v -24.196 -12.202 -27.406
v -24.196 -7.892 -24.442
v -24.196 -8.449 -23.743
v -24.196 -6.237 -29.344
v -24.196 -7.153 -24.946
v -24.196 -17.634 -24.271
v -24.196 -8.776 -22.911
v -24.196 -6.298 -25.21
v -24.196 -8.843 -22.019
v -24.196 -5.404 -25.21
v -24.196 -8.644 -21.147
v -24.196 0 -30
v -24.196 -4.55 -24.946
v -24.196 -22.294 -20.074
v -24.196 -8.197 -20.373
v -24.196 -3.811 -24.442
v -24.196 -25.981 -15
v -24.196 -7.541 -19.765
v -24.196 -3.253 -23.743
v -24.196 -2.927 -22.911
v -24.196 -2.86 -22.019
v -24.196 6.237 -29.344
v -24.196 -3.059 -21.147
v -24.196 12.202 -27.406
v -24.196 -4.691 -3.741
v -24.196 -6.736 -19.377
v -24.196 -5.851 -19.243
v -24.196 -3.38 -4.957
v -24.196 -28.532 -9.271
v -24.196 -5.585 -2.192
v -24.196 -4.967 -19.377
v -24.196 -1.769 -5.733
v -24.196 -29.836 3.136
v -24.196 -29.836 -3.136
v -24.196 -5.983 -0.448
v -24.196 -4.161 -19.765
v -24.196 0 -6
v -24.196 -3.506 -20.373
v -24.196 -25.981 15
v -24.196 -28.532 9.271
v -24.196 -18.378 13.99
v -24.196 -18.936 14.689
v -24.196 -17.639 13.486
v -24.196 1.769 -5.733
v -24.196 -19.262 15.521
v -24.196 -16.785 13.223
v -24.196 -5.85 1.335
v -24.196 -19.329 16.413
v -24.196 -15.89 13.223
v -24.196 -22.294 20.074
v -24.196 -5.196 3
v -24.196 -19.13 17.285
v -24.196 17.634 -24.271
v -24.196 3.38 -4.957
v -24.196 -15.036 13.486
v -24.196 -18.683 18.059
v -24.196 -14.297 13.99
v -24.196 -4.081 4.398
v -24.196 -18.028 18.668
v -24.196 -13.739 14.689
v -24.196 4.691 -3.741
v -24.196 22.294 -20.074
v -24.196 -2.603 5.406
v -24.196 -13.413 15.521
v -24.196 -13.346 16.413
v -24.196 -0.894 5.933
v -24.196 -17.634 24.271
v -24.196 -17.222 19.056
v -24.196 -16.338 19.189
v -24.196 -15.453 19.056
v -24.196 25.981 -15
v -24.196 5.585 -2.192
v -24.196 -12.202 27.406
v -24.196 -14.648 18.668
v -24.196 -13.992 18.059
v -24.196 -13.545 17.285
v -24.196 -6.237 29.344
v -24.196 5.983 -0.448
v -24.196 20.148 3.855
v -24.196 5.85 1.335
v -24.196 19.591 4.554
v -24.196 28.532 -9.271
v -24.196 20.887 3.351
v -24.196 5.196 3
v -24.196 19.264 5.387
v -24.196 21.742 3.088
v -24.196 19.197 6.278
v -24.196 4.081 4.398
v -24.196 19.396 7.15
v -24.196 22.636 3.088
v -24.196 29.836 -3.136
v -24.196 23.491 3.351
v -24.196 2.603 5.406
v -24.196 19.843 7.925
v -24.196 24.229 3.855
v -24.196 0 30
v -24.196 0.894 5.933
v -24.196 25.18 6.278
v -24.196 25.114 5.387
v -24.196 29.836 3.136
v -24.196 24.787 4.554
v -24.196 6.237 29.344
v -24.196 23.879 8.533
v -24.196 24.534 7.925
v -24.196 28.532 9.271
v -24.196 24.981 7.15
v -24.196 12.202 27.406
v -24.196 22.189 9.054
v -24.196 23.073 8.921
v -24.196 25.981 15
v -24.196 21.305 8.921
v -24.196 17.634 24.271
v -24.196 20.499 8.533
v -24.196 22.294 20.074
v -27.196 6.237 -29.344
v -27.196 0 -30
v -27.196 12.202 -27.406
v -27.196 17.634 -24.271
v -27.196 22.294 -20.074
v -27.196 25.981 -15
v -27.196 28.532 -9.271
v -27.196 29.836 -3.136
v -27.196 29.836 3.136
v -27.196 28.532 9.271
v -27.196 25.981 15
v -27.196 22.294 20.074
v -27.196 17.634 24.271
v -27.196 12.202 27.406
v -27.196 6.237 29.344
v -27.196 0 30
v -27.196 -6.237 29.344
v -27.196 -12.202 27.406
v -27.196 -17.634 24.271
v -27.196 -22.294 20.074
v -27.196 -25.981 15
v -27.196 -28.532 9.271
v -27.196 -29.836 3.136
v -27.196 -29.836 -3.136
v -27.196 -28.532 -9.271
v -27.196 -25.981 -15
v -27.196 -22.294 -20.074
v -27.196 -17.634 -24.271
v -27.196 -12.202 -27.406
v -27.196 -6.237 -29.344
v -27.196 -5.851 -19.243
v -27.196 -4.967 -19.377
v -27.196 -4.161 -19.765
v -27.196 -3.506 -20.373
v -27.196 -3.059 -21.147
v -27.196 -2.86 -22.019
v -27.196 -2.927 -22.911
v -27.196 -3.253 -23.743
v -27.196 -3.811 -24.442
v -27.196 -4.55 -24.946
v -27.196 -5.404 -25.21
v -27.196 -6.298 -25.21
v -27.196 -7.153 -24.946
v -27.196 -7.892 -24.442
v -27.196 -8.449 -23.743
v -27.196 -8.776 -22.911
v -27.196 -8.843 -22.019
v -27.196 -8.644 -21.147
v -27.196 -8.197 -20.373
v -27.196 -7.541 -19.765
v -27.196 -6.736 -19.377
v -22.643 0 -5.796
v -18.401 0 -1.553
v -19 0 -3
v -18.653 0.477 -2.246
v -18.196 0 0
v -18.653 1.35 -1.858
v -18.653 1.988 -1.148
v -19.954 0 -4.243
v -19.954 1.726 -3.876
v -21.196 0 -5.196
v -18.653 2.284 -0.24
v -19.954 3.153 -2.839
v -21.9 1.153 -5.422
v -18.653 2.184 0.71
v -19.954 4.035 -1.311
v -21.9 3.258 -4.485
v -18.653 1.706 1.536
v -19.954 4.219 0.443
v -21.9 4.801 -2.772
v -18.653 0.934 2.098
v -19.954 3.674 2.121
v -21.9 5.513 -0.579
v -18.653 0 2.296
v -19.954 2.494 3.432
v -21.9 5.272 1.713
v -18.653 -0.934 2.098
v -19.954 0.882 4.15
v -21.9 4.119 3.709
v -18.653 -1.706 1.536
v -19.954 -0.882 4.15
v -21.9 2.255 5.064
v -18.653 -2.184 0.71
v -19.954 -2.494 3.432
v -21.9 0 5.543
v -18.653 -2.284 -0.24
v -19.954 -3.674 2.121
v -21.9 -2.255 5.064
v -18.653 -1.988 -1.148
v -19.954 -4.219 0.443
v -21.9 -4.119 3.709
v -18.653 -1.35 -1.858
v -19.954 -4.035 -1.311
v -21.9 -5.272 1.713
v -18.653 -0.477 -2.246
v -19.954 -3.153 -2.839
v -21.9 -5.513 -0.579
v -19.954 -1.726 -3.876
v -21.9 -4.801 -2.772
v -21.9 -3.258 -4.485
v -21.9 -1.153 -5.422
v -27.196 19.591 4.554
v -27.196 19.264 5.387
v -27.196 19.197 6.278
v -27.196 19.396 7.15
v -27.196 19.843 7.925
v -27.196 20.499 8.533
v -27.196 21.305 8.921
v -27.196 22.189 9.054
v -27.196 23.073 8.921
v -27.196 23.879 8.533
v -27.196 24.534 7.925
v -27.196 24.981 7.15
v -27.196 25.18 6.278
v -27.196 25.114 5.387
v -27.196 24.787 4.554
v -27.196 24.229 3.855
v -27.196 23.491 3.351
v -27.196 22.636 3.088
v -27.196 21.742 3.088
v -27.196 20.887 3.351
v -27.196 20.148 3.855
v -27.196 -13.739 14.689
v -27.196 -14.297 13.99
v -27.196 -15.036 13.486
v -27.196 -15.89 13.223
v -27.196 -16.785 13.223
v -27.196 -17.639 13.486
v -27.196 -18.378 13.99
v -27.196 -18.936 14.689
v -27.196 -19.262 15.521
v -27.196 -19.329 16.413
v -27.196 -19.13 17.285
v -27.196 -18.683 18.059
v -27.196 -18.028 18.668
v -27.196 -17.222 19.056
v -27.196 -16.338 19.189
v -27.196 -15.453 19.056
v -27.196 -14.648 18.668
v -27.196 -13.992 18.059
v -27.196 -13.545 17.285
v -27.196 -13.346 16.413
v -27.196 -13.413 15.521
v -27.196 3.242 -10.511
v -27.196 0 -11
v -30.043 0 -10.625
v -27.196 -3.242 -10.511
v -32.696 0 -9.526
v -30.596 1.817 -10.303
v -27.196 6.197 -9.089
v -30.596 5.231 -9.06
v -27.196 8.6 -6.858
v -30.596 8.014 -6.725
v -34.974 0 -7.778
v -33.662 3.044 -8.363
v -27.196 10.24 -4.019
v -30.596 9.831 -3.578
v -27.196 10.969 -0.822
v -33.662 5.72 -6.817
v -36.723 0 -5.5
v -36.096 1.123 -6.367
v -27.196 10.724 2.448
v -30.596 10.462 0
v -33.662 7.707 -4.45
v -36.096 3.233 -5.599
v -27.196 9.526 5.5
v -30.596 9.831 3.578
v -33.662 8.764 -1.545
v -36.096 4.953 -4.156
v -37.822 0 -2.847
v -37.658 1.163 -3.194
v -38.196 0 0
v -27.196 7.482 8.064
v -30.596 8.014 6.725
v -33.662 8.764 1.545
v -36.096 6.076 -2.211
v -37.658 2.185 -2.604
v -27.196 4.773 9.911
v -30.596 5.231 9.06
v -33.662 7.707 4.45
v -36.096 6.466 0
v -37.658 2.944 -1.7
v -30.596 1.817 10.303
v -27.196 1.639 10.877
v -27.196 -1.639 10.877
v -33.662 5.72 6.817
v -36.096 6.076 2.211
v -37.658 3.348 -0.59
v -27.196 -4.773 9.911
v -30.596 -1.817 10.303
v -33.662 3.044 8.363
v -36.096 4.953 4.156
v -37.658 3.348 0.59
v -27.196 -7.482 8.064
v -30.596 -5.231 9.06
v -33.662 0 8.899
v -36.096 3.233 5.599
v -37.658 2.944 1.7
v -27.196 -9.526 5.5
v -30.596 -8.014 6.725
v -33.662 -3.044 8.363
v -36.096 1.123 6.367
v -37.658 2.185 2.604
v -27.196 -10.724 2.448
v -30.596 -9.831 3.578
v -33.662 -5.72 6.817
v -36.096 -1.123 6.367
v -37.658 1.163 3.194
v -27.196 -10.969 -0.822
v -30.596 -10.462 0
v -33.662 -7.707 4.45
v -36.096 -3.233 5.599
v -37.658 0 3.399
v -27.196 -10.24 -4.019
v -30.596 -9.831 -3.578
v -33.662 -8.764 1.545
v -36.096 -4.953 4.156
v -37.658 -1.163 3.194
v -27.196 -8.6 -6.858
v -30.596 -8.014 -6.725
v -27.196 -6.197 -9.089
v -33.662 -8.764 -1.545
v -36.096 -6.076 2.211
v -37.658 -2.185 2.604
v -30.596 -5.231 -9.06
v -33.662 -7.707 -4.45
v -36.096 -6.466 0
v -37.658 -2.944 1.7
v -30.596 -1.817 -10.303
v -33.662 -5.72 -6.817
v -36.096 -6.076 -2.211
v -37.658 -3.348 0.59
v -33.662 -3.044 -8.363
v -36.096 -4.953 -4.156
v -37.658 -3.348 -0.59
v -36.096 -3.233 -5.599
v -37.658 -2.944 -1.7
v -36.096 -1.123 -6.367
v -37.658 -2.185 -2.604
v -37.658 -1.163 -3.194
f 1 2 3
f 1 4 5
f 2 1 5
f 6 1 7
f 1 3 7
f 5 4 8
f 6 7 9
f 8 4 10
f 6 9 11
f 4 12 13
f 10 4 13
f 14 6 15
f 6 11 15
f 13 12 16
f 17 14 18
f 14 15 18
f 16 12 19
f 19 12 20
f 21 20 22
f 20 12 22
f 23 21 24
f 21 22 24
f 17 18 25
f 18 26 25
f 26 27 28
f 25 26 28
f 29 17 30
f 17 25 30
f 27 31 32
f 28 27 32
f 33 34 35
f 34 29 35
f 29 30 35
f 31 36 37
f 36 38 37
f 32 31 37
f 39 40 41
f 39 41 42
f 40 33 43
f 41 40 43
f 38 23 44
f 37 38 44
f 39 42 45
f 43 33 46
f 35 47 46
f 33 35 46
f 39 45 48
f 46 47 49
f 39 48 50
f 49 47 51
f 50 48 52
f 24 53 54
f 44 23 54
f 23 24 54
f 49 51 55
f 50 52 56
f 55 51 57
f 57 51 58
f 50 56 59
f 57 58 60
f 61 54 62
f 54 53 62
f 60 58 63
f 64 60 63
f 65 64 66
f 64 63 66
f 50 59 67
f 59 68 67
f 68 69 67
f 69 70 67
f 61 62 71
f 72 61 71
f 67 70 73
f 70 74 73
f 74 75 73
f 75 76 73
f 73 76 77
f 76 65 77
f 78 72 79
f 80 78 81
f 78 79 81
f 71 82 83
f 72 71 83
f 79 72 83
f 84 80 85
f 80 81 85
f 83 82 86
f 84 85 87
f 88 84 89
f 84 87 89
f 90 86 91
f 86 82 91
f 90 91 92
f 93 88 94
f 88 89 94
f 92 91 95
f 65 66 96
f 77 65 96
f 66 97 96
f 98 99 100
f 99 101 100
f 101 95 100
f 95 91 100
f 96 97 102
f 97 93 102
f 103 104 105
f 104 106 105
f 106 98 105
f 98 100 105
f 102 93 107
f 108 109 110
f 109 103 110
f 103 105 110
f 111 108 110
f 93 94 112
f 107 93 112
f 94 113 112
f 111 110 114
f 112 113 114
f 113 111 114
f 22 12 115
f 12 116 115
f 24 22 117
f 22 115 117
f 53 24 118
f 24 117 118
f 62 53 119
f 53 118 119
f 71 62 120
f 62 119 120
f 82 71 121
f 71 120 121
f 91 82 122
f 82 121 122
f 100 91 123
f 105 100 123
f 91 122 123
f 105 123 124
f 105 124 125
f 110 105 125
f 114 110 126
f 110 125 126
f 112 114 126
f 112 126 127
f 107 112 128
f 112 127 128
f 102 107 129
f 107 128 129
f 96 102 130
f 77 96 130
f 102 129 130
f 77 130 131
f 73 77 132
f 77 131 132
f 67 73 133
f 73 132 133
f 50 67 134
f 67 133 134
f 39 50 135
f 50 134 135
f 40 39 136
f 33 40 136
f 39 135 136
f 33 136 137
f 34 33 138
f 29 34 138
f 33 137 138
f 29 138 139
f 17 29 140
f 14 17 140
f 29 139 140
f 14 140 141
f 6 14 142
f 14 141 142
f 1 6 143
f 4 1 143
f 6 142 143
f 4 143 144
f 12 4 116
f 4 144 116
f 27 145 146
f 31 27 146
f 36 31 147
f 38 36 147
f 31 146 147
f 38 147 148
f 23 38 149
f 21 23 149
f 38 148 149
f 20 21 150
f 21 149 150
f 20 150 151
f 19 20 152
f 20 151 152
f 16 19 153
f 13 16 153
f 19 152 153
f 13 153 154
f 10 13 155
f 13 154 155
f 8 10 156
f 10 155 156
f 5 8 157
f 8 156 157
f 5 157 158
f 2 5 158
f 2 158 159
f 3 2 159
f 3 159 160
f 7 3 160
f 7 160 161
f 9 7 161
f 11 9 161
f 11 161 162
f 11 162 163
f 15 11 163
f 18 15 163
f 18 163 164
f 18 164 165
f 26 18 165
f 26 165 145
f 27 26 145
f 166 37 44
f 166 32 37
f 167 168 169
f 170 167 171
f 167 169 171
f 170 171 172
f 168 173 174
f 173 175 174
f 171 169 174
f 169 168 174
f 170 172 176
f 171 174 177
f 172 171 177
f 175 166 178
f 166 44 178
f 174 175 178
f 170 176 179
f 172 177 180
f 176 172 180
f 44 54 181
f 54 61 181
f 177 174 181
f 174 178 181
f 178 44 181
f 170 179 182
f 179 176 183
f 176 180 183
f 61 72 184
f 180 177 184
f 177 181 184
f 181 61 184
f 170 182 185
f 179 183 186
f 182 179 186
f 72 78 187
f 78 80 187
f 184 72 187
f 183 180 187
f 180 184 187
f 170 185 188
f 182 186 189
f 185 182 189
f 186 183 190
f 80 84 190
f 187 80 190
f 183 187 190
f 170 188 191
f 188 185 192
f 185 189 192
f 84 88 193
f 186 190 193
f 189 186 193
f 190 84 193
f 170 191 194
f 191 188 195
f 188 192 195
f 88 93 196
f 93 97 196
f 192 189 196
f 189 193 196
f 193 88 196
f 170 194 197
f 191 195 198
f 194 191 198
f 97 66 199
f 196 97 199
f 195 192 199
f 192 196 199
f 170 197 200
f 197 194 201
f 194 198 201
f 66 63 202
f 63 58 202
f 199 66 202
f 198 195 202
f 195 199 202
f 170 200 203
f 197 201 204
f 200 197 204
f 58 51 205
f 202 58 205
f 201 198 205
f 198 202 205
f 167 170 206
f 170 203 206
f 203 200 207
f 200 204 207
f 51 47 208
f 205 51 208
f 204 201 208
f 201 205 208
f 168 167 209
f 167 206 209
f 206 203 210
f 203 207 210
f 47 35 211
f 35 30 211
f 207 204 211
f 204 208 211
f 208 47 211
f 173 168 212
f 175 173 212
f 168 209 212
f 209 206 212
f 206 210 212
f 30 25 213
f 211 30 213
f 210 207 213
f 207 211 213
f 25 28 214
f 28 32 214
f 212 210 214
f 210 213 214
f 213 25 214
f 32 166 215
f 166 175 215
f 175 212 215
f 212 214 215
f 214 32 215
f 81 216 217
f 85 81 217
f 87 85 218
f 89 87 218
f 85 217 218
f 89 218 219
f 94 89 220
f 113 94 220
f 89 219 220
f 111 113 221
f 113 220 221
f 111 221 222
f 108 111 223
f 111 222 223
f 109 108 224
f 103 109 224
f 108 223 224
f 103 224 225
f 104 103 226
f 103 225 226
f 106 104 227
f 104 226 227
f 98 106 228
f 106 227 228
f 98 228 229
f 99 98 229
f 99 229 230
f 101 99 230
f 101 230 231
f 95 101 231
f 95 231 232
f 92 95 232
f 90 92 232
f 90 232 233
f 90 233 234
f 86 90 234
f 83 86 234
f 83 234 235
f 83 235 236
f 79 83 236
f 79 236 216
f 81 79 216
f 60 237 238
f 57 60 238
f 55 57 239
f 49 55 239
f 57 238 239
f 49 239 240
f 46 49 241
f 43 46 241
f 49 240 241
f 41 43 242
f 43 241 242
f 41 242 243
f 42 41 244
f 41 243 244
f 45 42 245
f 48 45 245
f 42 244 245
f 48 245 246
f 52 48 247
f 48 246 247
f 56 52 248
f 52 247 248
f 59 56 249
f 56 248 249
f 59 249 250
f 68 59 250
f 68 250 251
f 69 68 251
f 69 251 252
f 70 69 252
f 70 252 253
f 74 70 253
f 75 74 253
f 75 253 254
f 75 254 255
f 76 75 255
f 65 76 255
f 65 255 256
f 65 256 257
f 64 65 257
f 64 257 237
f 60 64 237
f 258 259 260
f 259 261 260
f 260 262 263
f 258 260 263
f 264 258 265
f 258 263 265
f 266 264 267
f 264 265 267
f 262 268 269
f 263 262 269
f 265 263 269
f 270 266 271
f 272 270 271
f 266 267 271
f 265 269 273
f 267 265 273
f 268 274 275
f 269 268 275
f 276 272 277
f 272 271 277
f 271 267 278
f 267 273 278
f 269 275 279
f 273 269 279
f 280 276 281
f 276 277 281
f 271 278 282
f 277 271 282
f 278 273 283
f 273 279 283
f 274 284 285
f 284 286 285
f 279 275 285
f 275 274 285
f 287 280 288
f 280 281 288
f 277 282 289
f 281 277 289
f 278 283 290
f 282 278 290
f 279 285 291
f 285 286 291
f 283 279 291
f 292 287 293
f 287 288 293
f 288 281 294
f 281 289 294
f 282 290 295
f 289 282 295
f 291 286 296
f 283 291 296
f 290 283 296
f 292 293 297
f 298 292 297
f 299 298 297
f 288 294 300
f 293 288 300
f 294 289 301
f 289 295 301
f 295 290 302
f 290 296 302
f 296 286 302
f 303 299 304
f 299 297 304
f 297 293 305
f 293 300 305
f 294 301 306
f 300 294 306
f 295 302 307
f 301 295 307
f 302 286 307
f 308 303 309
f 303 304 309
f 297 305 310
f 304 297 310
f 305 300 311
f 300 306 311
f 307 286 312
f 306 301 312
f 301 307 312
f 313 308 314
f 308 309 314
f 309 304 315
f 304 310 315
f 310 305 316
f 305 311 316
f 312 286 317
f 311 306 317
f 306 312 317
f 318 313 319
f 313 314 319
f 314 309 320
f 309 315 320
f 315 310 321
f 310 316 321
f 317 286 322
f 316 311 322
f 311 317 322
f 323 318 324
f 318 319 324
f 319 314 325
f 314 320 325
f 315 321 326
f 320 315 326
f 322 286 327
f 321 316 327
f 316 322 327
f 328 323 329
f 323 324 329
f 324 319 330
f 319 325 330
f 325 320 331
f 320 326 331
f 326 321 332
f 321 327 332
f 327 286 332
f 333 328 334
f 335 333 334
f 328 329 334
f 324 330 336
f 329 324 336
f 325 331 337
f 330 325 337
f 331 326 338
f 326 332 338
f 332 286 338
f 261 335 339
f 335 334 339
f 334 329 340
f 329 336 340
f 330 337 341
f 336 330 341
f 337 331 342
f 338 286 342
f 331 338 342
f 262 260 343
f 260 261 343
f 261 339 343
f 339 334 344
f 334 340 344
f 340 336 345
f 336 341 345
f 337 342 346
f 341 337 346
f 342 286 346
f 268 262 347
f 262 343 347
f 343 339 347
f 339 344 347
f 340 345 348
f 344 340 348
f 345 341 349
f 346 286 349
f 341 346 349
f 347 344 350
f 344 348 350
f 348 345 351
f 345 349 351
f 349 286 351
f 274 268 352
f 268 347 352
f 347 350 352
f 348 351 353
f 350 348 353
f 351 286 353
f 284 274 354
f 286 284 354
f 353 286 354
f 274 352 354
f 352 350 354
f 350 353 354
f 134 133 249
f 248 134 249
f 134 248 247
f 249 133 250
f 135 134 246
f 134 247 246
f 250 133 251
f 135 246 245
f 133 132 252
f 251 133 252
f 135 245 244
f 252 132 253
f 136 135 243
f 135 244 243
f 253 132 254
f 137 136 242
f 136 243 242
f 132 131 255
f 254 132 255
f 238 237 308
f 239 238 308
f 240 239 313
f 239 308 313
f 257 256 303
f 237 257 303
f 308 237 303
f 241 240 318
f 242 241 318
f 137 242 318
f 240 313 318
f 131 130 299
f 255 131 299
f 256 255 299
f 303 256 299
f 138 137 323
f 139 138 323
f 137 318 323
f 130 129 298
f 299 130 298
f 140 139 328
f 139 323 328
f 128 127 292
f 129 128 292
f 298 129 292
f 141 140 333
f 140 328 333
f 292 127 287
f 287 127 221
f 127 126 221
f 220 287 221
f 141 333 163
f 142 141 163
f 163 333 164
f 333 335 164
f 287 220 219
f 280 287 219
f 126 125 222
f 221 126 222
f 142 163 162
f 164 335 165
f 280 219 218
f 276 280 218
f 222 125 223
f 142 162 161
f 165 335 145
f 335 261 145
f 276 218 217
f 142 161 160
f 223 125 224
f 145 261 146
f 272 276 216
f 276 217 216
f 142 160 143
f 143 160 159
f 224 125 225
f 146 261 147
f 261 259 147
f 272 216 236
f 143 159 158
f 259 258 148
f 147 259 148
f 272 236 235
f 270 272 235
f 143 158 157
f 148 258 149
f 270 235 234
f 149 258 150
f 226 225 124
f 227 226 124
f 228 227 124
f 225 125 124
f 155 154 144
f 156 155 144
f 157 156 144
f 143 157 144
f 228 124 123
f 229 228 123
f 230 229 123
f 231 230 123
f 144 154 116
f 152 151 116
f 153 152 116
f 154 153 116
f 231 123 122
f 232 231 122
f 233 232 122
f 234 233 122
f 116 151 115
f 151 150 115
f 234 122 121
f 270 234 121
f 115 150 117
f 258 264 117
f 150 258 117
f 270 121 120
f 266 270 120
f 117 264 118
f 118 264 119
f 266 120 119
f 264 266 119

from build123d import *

# Parameters (mm, degrees)
ESQUISSE3_R                  = 3
ENL_V_MAT_EXTRU_1_DEPTH      = 10
R_P_TITION_CIRCULAIRE1_COUNT = 3


with BuildPart() as part:
    # Esquisse2 → Révolution1 (revolve)
    with BuildSketch(Plane(origin=(0, 0, 0), x_dir=(1, 0, 0), z_dir=(0, 1, 0))):
        with BuildLine():
            Line((-24.196325381, 6), (-24.196325381, 30))
            Line((-24.196325381, 30), (-27.196325381, 30))
            Line((-27.196325381, 30), (-27.196325381, 11))
            ThreePointArc((-27.196325381, 11), (-34.974499974, 7.778174593), (-38.196325381, 0))
            Line((-38.196325381, 0), (-18.196325381, 0))
            ThreePointArc((-18.196325381, 0), (-19.953684694, 4.242640687), (-24.196325381, 6))
        make_face()
    revolve(axis=Axis((-57.66931647, 0, 0), (1, 0, 0)))

    # Esquisse3 → Enlèv. mat.-Extru.1 (cut)
    with BuildSketch(Plane.ZY.offset(27.196325381)):
        with Locations((-22.243253738, -5.851295854)):
            Circle(ESQUISSE3_R)
    enl_v_mat_extru_1 = extrude(amount=-ENL_V_MAT_EXTRU_1_DEPTH, mode=Mode.SUBTRACT)

    # Répétition circulaire1: Enlèv. mat.-Extru.1 ×3 about axis
    r_p_tition_circulaire1_axis = Axis((0, 0, 0), (1, 0, 0))
    for i in range(1, R_P_TITION_CIRCULAIRE1_COUNT):
        add(enl_v_mat_extru_1.rotate(r_p_tition_circulaire1_axis, i * 360 / R_P_TITION_CIRCULAIRE1_COUNT), mode=Mode.SUBTRACT)


solid = part.part
